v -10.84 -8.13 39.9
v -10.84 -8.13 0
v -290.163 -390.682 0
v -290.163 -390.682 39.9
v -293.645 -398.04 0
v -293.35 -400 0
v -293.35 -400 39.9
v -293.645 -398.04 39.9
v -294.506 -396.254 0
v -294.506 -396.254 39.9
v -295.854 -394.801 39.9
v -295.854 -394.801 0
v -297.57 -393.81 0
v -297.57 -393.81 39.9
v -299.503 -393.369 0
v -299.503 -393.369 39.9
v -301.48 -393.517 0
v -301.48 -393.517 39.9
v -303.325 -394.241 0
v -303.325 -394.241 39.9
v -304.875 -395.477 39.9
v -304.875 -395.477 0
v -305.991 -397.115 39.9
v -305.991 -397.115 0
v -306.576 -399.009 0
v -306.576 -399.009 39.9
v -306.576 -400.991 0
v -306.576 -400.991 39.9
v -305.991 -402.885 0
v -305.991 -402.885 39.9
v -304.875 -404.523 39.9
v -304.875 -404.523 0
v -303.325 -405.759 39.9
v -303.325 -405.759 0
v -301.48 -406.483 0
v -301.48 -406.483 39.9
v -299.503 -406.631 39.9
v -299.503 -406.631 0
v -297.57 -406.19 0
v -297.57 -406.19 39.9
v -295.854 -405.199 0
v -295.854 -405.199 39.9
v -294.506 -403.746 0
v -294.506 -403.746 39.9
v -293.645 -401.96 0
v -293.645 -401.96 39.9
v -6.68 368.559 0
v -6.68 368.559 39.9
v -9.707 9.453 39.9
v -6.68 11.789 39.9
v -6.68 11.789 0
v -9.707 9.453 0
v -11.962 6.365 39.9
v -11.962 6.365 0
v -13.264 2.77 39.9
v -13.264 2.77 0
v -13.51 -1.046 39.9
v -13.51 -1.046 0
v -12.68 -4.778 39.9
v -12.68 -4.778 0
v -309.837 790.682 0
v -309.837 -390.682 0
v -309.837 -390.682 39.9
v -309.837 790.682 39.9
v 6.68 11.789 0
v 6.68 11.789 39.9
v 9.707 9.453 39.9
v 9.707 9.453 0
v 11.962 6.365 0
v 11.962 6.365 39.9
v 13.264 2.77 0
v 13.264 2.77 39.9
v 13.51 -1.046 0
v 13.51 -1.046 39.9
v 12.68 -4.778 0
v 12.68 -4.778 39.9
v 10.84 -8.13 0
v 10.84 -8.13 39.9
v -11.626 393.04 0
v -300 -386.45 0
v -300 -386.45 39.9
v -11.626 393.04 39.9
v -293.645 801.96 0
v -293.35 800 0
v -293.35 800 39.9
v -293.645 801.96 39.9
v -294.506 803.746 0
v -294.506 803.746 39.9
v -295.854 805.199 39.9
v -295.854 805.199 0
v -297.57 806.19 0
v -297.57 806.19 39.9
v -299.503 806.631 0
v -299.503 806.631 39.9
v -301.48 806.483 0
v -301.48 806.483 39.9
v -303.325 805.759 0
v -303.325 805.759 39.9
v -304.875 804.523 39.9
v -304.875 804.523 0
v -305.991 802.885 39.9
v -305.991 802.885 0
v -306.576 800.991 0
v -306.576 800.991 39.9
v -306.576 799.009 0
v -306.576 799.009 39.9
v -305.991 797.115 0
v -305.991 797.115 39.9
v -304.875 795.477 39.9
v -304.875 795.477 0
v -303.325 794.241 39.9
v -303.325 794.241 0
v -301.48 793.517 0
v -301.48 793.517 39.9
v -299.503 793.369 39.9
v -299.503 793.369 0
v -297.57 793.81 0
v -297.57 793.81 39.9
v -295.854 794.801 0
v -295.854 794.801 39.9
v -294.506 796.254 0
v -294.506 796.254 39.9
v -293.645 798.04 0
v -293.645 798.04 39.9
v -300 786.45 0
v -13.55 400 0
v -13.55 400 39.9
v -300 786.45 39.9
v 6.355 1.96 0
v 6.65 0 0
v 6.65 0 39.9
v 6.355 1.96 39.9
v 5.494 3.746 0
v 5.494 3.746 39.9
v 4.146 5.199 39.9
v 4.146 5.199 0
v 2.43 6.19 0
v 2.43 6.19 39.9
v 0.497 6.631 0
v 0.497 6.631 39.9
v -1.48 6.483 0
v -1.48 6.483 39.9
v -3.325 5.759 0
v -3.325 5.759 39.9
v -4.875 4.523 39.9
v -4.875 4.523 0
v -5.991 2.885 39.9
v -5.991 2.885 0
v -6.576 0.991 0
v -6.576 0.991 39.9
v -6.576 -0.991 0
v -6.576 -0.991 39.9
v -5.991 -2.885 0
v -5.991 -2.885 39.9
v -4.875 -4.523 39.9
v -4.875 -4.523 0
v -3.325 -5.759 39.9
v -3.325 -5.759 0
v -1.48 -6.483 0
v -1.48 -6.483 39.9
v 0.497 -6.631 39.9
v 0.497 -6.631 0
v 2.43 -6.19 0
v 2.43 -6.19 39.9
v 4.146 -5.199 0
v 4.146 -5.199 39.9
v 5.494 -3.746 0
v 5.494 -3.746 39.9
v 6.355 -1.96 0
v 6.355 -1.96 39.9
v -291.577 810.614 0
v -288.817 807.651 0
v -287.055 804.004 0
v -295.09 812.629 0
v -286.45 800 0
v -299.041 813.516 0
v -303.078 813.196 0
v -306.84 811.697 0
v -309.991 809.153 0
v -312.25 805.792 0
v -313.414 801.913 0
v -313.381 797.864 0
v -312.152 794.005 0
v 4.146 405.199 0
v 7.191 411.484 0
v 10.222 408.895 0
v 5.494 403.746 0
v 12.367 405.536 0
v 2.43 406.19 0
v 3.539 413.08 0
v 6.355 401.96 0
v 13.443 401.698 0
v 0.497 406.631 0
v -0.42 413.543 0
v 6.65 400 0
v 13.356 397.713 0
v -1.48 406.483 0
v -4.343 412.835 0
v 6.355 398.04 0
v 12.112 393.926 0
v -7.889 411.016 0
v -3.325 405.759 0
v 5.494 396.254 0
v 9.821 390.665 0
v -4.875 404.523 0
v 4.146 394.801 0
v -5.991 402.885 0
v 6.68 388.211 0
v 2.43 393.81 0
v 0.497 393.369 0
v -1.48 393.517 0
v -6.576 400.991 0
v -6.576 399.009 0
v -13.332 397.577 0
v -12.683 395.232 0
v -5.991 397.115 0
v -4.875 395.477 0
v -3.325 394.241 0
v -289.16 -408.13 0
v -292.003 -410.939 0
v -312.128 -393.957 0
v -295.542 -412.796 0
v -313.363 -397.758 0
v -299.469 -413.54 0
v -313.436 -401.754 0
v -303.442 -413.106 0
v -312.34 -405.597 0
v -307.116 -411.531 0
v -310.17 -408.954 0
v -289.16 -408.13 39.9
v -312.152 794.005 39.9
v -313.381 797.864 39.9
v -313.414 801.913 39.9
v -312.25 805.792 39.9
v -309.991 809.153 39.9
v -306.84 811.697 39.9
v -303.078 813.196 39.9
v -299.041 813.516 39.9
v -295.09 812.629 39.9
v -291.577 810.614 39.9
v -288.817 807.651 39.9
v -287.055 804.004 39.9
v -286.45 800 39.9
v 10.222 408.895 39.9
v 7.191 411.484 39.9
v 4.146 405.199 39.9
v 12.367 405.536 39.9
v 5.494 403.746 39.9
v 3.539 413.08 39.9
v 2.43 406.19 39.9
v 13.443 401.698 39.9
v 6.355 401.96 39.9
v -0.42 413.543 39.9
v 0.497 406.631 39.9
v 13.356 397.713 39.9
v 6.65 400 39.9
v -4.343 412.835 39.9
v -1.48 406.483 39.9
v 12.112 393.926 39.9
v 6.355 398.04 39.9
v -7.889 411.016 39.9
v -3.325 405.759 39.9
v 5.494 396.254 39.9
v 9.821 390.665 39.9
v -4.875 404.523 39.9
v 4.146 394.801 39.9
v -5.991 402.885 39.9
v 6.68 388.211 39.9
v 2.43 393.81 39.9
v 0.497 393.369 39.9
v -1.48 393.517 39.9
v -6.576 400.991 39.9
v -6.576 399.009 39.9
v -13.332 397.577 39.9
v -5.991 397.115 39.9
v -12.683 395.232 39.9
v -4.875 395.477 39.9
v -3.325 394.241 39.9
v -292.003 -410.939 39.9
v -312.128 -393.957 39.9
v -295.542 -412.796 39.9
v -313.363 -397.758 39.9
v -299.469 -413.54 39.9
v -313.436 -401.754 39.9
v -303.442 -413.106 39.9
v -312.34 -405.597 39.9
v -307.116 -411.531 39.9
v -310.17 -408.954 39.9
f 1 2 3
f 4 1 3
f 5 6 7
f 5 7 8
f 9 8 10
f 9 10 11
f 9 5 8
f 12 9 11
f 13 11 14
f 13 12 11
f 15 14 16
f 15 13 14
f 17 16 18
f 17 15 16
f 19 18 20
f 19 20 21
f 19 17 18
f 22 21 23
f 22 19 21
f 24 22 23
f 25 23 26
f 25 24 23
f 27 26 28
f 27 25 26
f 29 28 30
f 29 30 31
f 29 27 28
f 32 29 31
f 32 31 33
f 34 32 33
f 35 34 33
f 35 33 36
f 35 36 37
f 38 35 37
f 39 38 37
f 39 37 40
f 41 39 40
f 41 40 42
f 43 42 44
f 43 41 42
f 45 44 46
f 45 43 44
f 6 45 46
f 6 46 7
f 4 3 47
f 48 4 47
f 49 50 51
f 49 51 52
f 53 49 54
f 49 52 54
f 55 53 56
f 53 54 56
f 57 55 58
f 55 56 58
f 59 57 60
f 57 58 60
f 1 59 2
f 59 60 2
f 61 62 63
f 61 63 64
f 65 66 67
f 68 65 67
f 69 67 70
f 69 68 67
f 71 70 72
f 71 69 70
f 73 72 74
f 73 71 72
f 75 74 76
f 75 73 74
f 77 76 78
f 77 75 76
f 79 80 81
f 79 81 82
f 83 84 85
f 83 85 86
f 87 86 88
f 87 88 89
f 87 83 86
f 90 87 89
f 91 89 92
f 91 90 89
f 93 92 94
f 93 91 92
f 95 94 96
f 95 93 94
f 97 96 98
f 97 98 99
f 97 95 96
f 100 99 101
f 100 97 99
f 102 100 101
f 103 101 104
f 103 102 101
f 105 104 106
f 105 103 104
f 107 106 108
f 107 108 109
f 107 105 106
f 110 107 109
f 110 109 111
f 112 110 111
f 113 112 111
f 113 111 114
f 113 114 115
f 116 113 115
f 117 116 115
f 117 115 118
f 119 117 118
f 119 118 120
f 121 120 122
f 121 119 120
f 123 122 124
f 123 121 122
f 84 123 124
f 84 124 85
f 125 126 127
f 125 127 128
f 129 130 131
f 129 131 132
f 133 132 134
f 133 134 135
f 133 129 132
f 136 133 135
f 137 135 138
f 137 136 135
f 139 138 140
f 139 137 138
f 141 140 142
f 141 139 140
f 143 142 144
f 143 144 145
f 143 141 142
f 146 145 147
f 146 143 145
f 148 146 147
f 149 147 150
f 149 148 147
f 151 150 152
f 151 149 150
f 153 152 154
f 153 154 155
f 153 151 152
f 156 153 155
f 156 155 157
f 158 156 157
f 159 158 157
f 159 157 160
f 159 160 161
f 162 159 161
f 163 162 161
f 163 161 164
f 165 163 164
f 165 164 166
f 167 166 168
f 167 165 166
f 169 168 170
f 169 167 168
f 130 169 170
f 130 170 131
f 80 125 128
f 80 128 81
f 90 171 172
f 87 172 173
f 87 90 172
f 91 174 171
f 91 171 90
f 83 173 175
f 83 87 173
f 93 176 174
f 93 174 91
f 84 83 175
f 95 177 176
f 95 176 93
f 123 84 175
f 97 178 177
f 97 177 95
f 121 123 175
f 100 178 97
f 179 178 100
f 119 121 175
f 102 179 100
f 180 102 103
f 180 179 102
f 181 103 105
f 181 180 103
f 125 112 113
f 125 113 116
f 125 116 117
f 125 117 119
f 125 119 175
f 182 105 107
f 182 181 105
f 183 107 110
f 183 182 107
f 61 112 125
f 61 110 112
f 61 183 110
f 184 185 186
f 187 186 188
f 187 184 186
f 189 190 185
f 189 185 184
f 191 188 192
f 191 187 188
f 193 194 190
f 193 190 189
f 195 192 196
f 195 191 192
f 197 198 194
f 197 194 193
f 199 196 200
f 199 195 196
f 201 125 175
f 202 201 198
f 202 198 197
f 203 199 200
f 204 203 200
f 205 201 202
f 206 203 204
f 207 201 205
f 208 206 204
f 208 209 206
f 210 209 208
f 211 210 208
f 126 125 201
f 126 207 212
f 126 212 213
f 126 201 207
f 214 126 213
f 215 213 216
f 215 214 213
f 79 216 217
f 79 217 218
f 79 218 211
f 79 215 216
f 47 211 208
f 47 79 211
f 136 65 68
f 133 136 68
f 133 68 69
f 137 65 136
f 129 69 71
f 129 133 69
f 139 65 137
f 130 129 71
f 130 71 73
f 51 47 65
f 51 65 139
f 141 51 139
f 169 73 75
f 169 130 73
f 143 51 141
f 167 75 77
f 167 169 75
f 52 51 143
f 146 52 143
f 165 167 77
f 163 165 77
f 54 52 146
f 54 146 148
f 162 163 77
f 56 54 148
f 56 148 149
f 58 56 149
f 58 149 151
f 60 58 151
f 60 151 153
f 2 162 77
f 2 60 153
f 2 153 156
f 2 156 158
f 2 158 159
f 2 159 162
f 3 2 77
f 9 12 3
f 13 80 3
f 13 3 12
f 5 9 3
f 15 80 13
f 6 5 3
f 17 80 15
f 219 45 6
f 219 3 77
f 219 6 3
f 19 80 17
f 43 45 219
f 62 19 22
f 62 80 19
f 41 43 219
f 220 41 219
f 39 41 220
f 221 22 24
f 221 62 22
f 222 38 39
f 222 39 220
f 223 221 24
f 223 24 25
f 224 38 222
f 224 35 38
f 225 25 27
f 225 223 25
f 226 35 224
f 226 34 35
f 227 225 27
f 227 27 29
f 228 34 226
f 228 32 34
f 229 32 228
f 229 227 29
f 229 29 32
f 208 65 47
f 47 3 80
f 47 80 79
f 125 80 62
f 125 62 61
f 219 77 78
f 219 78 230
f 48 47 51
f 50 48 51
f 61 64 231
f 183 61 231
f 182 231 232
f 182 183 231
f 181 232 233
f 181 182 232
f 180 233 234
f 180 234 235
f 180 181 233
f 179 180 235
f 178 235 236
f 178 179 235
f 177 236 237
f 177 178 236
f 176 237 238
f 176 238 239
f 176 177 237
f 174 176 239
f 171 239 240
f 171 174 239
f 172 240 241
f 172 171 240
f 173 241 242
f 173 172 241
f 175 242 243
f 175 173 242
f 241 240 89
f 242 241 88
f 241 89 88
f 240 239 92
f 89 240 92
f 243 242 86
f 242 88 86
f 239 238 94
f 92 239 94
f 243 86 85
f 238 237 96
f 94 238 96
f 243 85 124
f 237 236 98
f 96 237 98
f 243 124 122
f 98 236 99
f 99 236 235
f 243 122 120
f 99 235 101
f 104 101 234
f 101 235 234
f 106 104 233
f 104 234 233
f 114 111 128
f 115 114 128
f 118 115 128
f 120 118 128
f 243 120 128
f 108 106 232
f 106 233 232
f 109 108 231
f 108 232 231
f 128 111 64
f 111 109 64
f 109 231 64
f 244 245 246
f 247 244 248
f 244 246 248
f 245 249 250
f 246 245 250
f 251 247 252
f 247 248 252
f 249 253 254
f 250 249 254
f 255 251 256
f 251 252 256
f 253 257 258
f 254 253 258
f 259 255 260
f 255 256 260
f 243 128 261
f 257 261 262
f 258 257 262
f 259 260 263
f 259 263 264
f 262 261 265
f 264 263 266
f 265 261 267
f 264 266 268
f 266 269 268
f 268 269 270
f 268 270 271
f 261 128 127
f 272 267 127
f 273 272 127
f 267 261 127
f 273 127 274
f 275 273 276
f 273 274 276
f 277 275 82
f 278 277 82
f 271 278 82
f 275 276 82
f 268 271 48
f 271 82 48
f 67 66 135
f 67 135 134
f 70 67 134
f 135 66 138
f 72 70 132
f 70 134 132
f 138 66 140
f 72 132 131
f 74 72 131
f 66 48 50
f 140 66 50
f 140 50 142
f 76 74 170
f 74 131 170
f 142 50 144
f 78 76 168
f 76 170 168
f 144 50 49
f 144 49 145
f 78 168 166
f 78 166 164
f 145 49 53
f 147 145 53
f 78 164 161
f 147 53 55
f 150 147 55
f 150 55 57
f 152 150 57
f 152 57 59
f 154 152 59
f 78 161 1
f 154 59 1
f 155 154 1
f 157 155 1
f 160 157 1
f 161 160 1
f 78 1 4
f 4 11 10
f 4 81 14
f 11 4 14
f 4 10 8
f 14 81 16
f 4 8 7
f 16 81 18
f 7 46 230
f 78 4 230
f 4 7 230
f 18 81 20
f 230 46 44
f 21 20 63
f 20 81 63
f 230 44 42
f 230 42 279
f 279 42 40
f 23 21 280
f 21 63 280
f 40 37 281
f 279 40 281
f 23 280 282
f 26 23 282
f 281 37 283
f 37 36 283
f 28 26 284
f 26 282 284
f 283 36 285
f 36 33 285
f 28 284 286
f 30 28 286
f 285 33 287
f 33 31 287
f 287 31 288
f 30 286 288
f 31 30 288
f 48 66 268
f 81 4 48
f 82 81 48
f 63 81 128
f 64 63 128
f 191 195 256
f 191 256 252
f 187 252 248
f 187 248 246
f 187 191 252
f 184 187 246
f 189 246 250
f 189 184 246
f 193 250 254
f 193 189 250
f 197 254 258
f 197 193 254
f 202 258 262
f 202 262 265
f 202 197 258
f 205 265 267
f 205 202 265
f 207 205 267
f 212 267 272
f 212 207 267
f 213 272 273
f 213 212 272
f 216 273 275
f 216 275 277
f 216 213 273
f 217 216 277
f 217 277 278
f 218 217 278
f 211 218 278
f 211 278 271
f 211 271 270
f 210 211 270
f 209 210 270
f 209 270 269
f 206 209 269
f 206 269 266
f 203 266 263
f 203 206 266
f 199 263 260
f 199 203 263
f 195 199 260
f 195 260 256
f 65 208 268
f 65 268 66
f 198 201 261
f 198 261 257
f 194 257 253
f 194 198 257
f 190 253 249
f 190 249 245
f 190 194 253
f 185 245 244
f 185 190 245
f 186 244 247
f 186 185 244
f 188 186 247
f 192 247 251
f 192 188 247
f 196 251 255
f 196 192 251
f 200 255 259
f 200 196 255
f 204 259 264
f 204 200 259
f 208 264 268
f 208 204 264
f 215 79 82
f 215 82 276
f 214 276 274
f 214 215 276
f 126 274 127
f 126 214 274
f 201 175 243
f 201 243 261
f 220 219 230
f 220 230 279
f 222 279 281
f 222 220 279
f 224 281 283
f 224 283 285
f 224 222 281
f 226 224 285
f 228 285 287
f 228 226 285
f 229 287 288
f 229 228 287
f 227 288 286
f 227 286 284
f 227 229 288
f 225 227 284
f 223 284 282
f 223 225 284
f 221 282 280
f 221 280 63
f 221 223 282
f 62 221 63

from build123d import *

# Parameters (mm, degrees)
SKETCH9_R           = 6.65
BOSS_EXTRUDE1_DEPTH = 39.9


with BuildPart() as part:
    # Sketch9 → Boss-Extrude1 (new body)
    with BuildSketch(Plane(origin=(0, 0, 0), x_dir=(0, 1, 0), z_dir=(0, 0, 1))):
        with BuildLine():
            Line((800, 286.45), (411.016496764, 7.889188745))
            ThreePointArc((411.016496764, 7.889188745), (407.294864157, -11.41873272), (388.21106152, -6.680077058))
            Line((388.21106152, -6.680077058), (11.78893848, -6.680077058))
            ThreePointArc((11.78893848, -6.680077058), (2.770053686, -13.263834384), (-8.13, -10.84))
            Line((-8.13, -10.84), (-408.13, 289.16))
            ThreePointArc((-408.13, 289.16), (-410.355747525, 308.738477739), (-390.681827116, 309.837385532))
            Line((-390.681827116, 309.837385532), (790.681827116, 309.837385532))
            ThreePointArc((790.681827116, 309.837385532), (812.58767401, 305.015272976), (800, 286.45))
        make_face()
        with Locations(Location((-400, 300, 0), (0, 0, 270))):
            Circle(SKETCH9_R, mode=Mode.SUBTRACT)
        with Locations(Location((0, 0, 0), (0, 0, 270))):
            Circle(SKETCH9_R, mode=Mode.SUBTRACT)
        with Locations(Location((400, 0, 0), (0, 0, 270))):
            Circle(SKETCH9_R, mode=Mode.SUBTRACT)
        with Locations(Location((800, 300, 0), (0, 0, 270))):
            Circle(SKETCH9_R, mode=Mode.SUBTRACT)
        with BuildLine():
            Line((-386.45, 300), (393.040410471, 11.626117735))
            ThreePointArc((393.040410471, 11.626117735), (396.389694979, 13.060176019), (400, 13.55))
            Line((400, 13.55), (786.45, 300))
            Line((786.45, 300), (-386.45, 300))
        make_face(mode=Mode.SUBTRACT)
        with BuildLine():
            Line((-390.681827116, 290.162614468), (368.558996023, 6.680077058))
            Line((368.558996023, 6.680077058), (11.78893848, 6.680077058))
            ThreePointArc((11.78893848, 6.680077058), (2.770053686, 13.263834384), (-8.13, 10.84))
            Line((-8.13, 10.84), (-390.681827116, 290.162614468))
        make_face(mode=Mode.SUBTRACT)
    extrude(amount=BOSS_EXTRUDE1_DEPTH)


solid = part.part
